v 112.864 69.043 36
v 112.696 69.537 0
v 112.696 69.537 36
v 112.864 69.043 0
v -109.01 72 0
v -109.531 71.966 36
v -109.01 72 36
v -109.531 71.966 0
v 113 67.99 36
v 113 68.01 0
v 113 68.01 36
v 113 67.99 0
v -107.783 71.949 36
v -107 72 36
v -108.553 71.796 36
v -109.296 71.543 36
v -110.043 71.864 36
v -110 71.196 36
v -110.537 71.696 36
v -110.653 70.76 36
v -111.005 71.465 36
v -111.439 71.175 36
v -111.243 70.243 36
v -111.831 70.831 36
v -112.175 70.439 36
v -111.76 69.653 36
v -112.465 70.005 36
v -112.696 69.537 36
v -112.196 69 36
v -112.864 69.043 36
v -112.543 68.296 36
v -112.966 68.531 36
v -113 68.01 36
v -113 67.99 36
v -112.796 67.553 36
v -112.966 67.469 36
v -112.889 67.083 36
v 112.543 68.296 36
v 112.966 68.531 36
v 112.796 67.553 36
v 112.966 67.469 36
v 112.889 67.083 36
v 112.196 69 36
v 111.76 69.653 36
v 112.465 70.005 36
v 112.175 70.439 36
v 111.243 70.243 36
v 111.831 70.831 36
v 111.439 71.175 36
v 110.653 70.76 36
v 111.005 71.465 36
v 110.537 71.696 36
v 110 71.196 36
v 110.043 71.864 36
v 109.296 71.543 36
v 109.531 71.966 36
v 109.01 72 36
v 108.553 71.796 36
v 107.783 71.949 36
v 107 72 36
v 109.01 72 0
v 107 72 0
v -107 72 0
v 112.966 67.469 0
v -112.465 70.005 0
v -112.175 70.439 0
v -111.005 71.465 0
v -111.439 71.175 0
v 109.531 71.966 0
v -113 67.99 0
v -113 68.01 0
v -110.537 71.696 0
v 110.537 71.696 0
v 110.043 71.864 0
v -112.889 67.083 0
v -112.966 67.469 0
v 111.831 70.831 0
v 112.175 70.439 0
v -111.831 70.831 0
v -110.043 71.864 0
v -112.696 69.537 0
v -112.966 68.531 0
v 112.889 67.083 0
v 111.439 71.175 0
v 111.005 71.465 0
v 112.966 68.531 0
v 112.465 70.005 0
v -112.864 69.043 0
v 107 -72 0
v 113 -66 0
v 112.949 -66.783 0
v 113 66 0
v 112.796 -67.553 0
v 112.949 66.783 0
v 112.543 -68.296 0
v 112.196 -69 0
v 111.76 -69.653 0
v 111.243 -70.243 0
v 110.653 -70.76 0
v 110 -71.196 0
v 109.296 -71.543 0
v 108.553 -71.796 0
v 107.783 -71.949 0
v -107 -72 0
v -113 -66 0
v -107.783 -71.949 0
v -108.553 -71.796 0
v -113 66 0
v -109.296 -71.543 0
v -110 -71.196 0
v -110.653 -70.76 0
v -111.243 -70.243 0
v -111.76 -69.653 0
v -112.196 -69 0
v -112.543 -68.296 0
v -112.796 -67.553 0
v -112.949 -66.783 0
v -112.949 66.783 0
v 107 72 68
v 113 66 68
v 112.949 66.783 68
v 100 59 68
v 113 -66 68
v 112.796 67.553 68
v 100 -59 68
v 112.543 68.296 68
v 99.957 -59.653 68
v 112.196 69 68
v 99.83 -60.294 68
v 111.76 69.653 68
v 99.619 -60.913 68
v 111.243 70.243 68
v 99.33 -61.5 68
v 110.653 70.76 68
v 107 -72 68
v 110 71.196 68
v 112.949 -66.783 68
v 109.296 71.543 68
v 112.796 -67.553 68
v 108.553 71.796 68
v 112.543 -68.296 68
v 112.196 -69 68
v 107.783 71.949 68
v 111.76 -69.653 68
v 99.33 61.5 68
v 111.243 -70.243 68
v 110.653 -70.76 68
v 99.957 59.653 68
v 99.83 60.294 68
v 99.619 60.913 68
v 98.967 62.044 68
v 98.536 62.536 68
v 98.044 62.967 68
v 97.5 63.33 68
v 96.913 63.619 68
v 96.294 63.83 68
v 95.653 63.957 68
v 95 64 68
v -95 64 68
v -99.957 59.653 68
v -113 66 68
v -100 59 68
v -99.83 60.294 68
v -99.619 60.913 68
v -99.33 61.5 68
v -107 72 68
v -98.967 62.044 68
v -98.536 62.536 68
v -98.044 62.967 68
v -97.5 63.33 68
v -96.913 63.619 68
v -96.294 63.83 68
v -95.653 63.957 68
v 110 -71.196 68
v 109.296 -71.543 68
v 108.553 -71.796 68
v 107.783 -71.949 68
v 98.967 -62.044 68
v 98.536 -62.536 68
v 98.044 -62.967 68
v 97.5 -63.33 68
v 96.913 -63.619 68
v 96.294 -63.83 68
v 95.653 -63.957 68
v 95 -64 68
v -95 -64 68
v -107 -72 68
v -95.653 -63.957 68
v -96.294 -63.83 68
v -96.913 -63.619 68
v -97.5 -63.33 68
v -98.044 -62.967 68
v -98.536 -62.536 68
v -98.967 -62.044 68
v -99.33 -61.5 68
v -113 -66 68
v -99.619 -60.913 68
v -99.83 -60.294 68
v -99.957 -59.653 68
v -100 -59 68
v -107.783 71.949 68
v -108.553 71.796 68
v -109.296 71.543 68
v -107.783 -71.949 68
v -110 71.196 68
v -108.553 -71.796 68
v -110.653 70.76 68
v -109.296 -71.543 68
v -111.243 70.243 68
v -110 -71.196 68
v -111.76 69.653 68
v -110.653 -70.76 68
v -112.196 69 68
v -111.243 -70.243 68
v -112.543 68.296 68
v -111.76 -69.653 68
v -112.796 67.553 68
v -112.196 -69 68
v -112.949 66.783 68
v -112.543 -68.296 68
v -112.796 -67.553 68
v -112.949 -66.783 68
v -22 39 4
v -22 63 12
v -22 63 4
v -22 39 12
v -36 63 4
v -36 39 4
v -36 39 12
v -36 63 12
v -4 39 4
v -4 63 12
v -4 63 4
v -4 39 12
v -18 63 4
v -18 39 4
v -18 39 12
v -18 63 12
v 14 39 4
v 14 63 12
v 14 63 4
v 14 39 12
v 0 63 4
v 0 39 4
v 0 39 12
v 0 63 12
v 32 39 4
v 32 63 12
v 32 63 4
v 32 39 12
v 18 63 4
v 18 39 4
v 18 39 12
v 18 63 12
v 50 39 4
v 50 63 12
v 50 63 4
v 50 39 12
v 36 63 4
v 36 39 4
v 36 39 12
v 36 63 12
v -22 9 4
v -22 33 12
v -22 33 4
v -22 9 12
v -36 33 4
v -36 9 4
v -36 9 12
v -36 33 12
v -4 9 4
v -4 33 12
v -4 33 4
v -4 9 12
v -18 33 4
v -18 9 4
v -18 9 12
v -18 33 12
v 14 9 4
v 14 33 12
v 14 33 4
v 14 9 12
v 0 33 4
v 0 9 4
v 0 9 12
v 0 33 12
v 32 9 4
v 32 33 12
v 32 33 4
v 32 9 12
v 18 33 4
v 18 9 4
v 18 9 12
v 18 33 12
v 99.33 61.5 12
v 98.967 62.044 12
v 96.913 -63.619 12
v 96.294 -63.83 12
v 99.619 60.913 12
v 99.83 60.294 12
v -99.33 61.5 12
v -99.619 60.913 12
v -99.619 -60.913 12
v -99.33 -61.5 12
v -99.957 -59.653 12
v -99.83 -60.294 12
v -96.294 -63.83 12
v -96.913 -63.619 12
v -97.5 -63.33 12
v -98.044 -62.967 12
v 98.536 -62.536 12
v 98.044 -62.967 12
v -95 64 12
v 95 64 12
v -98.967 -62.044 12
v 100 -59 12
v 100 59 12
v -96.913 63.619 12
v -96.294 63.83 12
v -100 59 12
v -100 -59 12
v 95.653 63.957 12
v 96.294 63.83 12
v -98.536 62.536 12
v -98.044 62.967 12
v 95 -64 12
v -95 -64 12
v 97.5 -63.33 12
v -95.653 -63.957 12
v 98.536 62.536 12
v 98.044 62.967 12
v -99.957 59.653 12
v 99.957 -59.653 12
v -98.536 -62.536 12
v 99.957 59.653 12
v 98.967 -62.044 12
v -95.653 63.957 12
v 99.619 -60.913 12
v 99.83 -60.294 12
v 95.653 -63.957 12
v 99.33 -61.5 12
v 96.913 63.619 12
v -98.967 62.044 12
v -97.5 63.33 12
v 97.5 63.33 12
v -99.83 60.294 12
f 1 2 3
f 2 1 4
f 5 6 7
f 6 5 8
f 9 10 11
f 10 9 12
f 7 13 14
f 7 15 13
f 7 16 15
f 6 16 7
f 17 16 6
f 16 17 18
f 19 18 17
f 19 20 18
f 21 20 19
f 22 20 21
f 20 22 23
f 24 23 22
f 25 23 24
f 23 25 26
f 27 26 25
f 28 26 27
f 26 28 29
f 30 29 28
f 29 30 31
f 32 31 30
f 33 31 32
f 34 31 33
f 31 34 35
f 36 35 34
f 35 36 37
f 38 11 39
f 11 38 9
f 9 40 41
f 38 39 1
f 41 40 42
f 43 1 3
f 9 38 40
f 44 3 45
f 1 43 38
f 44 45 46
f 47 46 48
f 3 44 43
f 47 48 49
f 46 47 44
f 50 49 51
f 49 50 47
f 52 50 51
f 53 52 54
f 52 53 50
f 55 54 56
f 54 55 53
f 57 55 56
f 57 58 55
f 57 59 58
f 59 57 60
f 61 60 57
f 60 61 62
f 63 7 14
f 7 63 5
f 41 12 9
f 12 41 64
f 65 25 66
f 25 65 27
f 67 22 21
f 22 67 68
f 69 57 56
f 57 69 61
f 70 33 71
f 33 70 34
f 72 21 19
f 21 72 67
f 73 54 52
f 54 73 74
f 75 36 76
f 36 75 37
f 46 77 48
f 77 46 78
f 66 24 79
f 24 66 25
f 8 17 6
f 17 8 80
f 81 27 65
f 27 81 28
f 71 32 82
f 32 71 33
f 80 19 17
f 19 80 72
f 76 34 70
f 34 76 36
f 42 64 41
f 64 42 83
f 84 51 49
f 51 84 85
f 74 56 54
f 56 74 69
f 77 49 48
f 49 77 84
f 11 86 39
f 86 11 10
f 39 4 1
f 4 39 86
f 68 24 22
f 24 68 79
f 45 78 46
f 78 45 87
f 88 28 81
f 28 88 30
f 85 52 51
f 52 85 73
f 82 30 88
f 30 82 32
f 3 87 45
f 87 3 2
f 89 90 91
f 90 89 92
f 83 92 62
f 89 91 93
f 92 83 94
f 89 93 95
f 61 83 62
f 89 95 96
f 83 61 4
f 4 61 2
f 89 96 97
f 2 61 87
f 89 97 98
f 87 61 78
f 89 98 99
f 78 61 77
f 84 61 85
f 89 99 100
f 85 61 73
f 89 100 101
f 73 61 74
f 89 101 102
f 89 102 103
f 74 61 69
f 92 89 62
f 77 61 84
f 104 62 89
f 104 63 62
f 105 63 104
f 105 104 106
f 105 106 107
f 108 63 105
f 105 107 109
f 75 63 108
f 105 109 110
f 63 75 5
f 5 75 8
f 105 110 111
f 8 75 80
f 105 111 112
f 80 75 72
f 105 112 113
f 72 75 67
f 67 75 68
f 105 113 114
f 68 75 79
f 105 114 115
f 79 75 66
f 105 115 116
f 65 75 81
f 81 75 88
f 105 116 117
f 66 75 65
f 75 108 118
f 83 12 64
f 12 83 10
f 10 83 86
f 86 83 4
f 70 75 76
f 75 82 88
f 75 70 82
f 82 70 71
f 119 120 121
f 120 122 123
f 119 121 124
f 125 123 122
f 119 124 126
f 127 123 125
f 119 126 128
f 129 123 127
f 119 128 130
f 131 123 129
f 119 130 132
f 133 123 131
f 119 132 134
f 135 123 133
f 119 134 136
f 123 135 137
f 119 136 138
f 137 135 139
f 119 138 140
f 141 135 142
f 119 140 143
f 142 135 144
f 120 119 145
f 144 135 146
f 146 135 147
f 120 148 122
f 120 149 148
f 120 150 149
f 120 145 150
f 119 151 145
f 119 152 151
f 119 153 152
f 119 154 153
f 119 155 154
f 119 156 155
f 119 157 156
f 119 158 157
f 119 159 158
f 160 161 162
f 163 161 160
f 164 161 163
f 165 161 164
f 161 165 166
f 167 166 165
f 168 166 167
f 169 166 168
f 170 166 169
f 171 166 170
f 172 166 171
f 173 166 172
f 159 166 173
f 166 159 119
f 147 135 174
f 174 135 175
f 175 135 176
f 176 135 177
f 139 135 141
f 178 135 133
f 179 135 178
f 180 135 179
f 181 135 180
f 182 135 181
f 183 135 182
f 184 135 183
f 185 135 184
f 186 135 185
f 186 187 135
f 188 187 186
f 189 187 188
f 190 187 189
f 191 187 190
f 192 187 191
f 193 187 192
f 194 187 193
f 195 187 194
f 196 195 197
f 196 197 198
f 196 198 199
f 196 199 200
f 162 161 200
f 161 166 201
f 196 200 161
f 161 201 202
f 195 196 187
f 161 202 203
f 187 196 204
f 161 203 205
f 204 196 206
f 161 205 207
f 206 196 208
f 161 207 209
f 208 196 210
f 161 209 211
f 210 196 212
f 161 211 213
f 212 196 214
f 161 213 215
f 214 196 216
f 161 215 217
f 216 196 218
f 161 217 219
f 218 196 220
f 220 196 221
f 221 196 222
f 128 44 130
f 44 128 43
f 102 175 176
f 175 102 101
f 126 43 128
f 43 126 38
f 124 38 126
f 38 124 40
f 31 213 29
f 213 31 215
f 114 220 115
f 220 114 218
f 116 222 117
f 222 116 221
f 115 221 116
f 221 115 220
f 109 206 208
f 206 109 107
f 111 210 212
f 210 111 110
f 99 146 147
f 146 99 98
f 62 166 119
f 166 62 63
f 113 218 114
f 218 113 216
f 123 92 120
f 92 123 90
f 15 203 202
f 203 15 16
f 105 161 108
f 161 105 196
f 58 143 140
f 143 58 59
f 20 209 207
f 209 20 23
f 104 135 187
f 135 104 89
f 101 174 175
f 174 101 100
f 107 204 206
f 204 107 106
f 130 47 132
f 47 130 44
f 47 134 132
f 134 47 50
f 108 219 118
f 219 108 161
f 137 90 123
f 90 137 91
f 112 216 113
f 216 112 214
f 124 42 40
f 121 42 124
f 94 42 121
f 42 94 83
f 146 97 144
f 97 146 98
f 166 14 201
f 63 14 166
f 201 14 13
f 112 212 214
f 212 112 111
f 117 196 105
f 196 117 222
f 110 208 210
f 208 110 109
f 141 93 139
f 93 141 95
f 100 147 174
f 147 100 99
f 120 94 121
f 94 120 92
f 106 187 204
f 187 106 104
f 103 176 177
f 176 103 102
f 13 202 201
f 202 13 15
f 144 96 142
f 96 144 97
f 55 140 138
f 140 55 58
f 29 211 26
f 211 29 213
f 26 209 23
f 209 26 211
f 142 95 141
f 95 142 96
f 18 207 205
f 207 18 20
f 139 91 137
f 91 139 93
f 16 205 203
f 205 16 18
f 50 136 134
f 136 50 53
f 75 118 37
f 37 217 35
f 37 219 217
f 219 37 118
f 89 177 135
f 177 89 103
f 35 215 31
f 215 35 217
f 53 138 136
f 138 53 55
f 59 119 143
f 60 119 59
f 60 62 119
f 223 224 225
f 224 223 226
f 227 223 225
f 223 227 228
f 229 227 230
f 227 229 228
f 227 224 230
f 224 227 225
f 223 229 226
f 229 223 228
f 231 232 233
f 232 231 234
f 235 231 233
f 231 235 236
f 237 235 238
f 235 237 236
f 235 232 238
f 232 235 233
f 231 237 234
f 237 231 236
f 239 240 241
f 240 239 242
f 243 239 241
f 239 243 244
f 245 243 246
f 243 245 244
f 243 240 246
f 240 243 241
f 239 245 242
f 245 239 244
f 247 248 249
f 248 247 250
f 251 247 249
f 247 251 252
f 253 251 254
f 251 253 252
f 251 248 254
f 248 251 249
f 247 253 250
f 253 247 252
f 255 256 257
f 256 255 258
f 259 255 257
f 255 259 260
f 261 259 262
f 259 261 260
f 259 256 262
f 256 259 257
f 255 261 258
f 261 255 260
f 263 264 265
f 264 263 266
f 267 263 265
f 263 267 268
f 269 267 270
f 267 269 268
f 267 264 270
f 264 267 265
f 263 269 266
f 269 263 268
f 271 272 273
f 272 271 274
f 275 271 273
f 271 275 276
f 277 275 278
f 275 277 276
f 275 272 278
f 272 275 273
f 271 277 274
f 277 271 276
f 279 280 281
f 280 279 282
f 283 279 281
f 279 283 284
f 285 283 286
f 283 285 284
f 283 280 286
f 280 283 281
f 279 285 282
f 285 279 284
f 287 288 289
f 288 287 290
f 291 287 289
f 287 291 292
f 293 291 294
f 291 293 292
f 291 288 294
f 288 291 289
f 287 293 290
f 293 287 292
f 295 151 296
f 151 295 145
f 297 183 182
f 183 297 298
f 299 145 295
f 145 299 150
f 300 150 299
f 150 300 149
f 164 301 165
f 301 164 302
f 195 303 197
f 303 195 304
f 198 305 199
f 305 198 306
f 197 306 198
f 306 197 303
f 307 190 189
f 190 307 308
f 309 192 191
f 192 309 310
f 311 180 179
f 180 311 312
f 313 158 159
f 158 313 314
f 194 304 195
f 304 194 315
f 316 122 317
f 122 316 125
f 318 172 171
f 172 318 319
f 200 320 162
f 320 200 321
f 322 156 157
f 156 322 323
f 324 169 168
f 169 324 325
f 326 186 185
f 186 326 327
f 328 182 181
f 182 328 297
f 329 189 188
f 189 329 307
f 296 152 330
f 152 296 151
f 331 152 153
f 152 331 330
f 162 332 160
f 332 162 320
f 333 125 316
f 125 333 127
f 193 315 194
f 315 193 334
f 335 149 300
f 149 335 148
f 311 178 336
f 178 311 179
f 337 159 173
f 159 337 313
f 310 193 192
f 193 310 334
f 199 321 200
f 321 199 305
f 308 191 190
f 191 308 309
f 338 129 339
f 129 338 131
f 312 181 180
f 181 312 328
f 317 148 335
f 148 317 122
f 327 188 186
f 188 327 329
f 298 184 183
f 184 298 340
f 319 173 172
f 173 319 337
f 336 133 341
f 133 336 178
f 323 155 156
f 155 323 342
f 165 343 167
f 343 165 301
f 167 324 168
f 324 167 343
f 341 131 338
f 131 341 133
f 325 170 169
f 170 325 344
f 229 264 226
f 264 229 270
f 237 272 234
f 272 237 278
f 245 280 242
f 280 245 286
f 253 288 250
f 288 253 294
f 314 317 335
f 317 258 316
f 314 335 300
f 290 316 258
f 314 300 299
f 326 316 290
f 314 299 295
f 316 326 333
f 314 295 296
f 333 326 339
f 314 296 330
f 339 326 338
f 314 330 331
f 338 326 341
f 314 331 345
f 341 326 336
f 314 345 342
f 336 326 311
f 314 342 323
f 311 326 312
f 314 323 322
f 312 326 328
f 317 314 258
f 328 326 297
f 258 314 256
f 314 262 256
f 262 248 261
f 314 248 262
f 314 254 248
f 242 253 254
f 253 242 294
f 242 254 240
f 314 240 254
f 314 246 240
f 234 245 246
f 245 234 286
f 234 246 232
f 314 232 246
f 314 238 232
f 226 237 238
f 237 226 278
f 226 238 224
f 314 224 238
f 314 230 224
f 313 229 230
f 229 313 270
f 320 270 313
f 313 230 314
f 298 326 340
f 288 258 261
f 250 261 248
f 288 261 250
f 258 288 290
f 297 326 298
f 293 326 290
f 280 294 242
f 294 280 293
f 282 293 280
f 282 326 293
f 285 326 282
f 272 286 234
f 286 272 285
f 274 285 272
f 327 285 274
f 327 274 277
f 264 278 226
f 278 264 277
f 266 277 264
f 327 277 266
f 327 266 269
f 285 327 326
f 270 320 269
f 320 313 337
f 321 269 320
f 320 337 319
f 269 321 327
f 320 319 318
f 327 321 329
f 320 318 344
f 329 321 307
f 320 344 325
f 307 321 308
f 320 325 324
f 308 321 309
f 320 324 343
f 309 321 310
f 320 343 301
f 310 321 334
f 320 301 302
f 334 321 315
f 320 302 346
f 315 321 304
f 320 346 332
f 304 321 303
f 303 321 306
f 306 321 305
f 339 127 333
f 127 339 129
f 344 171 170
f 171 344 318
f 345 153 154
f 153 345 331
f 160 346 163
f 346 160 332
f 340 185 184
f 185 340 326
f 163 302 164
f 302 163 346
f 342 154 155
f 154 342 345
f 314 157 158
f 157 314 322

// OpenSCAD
// file: ../params.scad
// LEGACY OpenSCAD — not maintained. Edit design/bed_params.json + Fusion builder instead.

// --- Printer envelope (Bambu P2S) ---
build_max = 256;
print_margin = 4;
print_limit = build_max - print_margin;

// --- Cell grid ---
grid_n = 3;
cell_pitch = 76;
wall_t = 3;
well_open = 58;
flange_seat = 64;
cassette_h = 18;
port_d = 6.5;

// --- Deck structure ---
deck_top_t = 4;
cavity_h = 32; // tube routing under cell deck (not electronics bay)
deck_rim = 8;
corner_r = 6;

// --- 370 micro pump (Taobao kit / photo vs Arduino; see docs/HARDWARE_DIMENSIONS.md) ---
pump_motor_d = 24.5;
pump_head_d = 31;
pump_axis_l = 68;
pump_nozzle_h = 8;
pump_port_od = 4.2;
pump_wire_tail = 35;
pump_count = 8; // set 6–8; layout skips extras above pump_count
pump_rows = 2;
pump_cols = 4;
pump_col_pitch = 36; // center distance along X
pump_row_pitch = 38; // center distance along Y
pump_cradle_z = 2; // floor of cradle above tray surface

// --- Solenoid (kit) ---
valve_l = 22;
valve_w = 12;
valve_h = 30;
valve_count = grid_n * grid_n;

// --- Arduino Uno + sensor shield (kit photo) ---
ctrl_board_l = 69;
ctrl_board_w = 54;
arduino_l = ctrl_board_l;
arduino_w = ctrl_board_w;
arduino_stack_h = 28;
arduino_standoff_h = 6;
arduino_usb_slot_w = 14;
arduino_usb_slot_h = 8;

// --- Closed electronics bay (pumps + Arduino, under service deck) ---
e_bay_x = 200;
e_bay_y = 128;
e_bay_cavity_h = 52;
e_bay_split_x = 100; // optional left/right print split at this X (local)
e_bay_tray_t = 4;
e_bay_rim_h = 8;

// Pump block placement inside bay (local coords, center = origin)
pump_block_w = (pump_cols - 1) * pump_col_pitch + pump_axis_l;
pump_block_h = (pump_rows - 1) * pump_row_pitch + pump_head_d;
pump_block_x0 = -pump_block_w / 2 - 8;
pump_block_y0 = -8;
arduino_pocket_x = e_bay_x / 2 - deck_rim - ctrl_board_l / 2 - 6;
arduino_pocket_y = -e_bay_y / 2 + deck_rim + ctrl_board_w / 2 + 6;

wire_gutter_d = 10;

// --- Service module (solid deck above electronics bay) ---
service_len = e_bay_y + deck_rim * 2;
service_deck_solid = true;

// --- Bottom / screw housing ---
panel_t = 4;
panel_screw_d = 3.4;
panel_screw_pitch = 35;
flange_screw_pitch = 40;
boss_od = 8;
split_flange_t = 10;

// --- Tube routing (cell deck) ---
// Each cell: one tube at bottom-center of well (not visible from top).
tube_od = 6;
tube_clip_id = tube_od + 0.6;
channel_w = tube_od + 4;
channel_depth = 8;
stem_pocket_d = channel_w; // barb + bend relief under well floor
stem_pocket_h = channel_depth + 4;

// --- Joint between deck sections ---
dowel_d = 5;
dowel_depth = 10;
lap_joint_screw_d = 3.4;

slip_fit = 0.25;
eps = 0.01;

function grid_span(n, pitch) = (n - 1) * pitch;
grid_xy = grid_span(grid_n, cell_pitch) + well_open + deck_rim * 2;
deck_cell_x = grid_xy;
deck_cell_y = grid_xy;
deck_service_x = max(deck_cell_x, e_bay_x + deck_rim * 2);
deck_service_y = service_len;
// file: ../lib/joints.scad
include <../params.scad>

// M3 screw housing — shared across split plates

module m3_clearance_hole(h, d = panel_screw_d) {
  translate([0, 0, -eps])
    cylinder(h = h + 2 * eps, d = d, $fn = 20);
}

module m3_boss(od, h, hole_d = panel_screw_d) {
  difference() {
    cylinder(h = h, d = od, $fn = 32);
    m3_clearance_hole(h + 2, hole_d);
  }
}

// Heat-set insert pocket (M3, optional)
module m3_insert_pocket(h = 4.5) {
  translate([0, 0, -eps])
    cylinder(h = h + eps, d = 4.2, $fn = 24); // ~M3 brass insert
}

// Perimeter screw grid on rectangular plate
module perimeter_boss_grid(x, y, z_base, boss_h, inset = deck_rim) {
  nx = max(2, floor((x - 2 * inset) / flange_screw_pitch));
  ny = max(2, floor((y - 2 * inset) / flange_screw_pitch));
  for (i = [0 : nx])
    for (j = [0 : ny]) {
      if (i == 0 || i == nx || j == 0 || j == ny) {
        px = -x / 2 + inset + i * (x - 2 * inset) / nx;
        py = -y / 2 + inset + j * (y - 2 * inset) / ny;
        translate([px, py, z_base])
          m3_boss(boss_od, boss_h);
      }
    }
}

// Split flange: two half-plates mate at x = 0 (local coords), extra thickness at seam
module split_flange_seam(seam_y, length_y, t = split_flange_t) {
  translate([-split_flange_t / 2, -length_y / 2, 0])
    cube([split_flange_t, length_y, t]);
}

module split_flange_holes_z(z, length_y, count = 3) {
  for (k = [0 : count - 1]) {
    y = -length_y / 2 + (k + 1) * length_y / (count + 1);
    translate([0, y, -eps])
      m3_clearance_hole(z + 2);
  }
}
// file: ../lib/util.scad
include <../params.scad>

module rounded_rect_xy(x, y, r) {
  r2 = min(r, x / 2 - eps, y / 2 - eps);
  minkowski() {
    square([x - 2 * r2, y - 2 * r2], center = true);
    circle(r = r2, $fn = 48);
  }
}

module rounded_rect_3d(x, y, z, r) {
  linear_extrude(height = z, center = false, convexity = 4)
    rounded_rect_xy(x, y, r);
}

module well_cut(open_size, depth) {
  linear_extrude(height = depth + eps)
    rounded_rect_xy(open_size, open_size, corner_r - 1);
}

module port_hole(d = port_d) {
  cylinder(h = deck_top_t + cavity_h + panel_t + 2, d = d, center = false, $fn = 32);
}

// Bottom-center of cell well: through 4 mm floor into routing cavity (hidden from top).
module cell_bottom_port() {
  translate([0, 0, -eps])
    cylinder(h = deck_top_t + eps, d = port_d, $fn = 32);
}

module cell_stem_pocket(h = stem_pocket_h, d = stem_pocket_d) {
  translate([0, 0, -deck_top_t])
    cylinder(h = h, d = d, $fn = 32);
}

// Horizontal groove under deck (−Y toward service bay), centered on cell X.
module cell_run_to_service(run_len) {
  if (run_len > 2)
    translate([0, -run_len / 2, -deck_top_t - channel_depth / 2])
      cube([channel_w, run_len, channel_depth], center = true);
}

function service_foot_y(deck_y) = -deck_y / 2 + deck_rim;

function cell_run_len(cell_y, deck_y) = cell_y - service_foot_y(deck_y);

module cell_underdeck_plumbing(cell_y, deck_y) {
  cell_bottom_port();
  cell_stem_pocket();
  cell_run_to_service(cell_run_len(cell_y, deck_y));
}

module dowel_hole(depth = dowel_depth) {
  cylinder(h = depth + eps, d = dowel_d + slip_fit, $fn = 32);
}

module dowel_pin(h = dowel_depth) {
  cylinder(h = h, d = dowel_d - 0.05, $fn = 32);
}

// Route from cell center toward service bay (-Y direction)
module tube_channel(length, w = channel_w, d = channel_depth) {
  translate([0, -length / 2, -d])
    cube([w, length, d], center = true);
}

module tube_clip_body() {
  clip_w = 12;
  clip_h = channel_depth + 4;
  difference() {
    rounded_rect_3d(clip_w, clip_w, clip_h, 2);
    translate([0, 0, 2])
      cylinder(h = clip_h, d = tube_clip_id, $fn = 32);
    // snap slot
    translate([clip_w / 2 - 1, 0, clip_h / 2])
      cube([2, clip_w, clip_h], center = true);
  }
}
// main file
// Export: deck_service_section.stl — solid deck + valve pockets; sits on electronics_bay_rim
include <../lib/util.scad>
include <../lib/joints.scad>

module valve_slot(idx, cols = 5) {
  col = idx % cols;
  row = floor(idx / cols);
  pitch_x = valve_w + 6;
  pitch_y = valve_l + 8;
  ox = (col - (cols - 1) / 2) * pitch_x;
  oy = deck_service_y / 2 - deck_rim - 25 - row * pitch_y;
  translate([ox, oy, deck_top_t])
    cube([valve_w + 2, valve_l + 2, min(valve_h, e_bay_cavity_h - 6)], center = false);
}

module head_joint() {
  y = deck_service_y / 2 - deck_rim / 2;
  difference() {
    translate([0, y, 0])
      rounded_rect_3d(deck_service_x, deck_rim, deck_top_t + cavity_h, corner_r);
    for (x = [-deck_service_x / 4, deck_service_x / 4])
      translate([x, y, deck_top_t + cavity_h - dowel_depth])
        dowel_hole();
    for (x = [-deck_service_x / 3, deck_service_x / 3])
      translate([x, y - deck_rim / 2, -eps])
        cylinder(h = deck_top_t + cavity_h + 2, d = lap_joint_screw_d, $fn = 24);
  }
}

module deck_service_section() {
  total_h = deck_top_t + e_bay_cavity_h + e_bay_rim_h + e_bay_tray_t;

  difference() {
    union() {
      rounded_rect_3d(deck_service_x, deck_service_y, total_h, corner_r);
      head_joint();
      // electronics bay enclosure walls (aligned to e_bay_x)
      translate([0, 0, deck_top_t])
        difference() {
          rounded_rect_3d(e_bay_x + 4, e_bay_y + 4, e_bay_cavity_h + e_bay_rim_h + e_bay_tray_t, corner_r);
          translate([0, 0, e_bay_rim_h])
            rounded_rect_3d(e_bay_x, e_bay_y, e_bay_cavity_h + e_bay_tray_t + eps, corner_r - 1);
        }
    }
    // cavity for pumps + Arduino (closed by bottom panel)
    translate([0, 0, deck_top_t + e_bay_rim_h])
      rounded_rect_3d(e_bay_x, e_bay_y, e_bay_cavity_h + e_bay_tray_t + eps, corner_r - 1);
    // valve pockets under solid deck (forward / toward cells)
    for (v = [0 : min(valve_count, 9) - 1])
      valve_slot(v);
    // bolt rim to service deck
    translate([0, 0, deck_top_t + e_bay_rim_h + e_bay_tray_t - eps])
      perimeter_boss_grid(e_bay_x, e_bay_y, 0, 12, deck_rim);
    // supply channel toward cells
    translate([0, deck_service_y / 2 - 18, deck_top_t + total_h - channel_depth - 2])
      cube([deck_service_x - 40, 14, channel_depth + 2], center = true);
  }
}

deck_service_section();
